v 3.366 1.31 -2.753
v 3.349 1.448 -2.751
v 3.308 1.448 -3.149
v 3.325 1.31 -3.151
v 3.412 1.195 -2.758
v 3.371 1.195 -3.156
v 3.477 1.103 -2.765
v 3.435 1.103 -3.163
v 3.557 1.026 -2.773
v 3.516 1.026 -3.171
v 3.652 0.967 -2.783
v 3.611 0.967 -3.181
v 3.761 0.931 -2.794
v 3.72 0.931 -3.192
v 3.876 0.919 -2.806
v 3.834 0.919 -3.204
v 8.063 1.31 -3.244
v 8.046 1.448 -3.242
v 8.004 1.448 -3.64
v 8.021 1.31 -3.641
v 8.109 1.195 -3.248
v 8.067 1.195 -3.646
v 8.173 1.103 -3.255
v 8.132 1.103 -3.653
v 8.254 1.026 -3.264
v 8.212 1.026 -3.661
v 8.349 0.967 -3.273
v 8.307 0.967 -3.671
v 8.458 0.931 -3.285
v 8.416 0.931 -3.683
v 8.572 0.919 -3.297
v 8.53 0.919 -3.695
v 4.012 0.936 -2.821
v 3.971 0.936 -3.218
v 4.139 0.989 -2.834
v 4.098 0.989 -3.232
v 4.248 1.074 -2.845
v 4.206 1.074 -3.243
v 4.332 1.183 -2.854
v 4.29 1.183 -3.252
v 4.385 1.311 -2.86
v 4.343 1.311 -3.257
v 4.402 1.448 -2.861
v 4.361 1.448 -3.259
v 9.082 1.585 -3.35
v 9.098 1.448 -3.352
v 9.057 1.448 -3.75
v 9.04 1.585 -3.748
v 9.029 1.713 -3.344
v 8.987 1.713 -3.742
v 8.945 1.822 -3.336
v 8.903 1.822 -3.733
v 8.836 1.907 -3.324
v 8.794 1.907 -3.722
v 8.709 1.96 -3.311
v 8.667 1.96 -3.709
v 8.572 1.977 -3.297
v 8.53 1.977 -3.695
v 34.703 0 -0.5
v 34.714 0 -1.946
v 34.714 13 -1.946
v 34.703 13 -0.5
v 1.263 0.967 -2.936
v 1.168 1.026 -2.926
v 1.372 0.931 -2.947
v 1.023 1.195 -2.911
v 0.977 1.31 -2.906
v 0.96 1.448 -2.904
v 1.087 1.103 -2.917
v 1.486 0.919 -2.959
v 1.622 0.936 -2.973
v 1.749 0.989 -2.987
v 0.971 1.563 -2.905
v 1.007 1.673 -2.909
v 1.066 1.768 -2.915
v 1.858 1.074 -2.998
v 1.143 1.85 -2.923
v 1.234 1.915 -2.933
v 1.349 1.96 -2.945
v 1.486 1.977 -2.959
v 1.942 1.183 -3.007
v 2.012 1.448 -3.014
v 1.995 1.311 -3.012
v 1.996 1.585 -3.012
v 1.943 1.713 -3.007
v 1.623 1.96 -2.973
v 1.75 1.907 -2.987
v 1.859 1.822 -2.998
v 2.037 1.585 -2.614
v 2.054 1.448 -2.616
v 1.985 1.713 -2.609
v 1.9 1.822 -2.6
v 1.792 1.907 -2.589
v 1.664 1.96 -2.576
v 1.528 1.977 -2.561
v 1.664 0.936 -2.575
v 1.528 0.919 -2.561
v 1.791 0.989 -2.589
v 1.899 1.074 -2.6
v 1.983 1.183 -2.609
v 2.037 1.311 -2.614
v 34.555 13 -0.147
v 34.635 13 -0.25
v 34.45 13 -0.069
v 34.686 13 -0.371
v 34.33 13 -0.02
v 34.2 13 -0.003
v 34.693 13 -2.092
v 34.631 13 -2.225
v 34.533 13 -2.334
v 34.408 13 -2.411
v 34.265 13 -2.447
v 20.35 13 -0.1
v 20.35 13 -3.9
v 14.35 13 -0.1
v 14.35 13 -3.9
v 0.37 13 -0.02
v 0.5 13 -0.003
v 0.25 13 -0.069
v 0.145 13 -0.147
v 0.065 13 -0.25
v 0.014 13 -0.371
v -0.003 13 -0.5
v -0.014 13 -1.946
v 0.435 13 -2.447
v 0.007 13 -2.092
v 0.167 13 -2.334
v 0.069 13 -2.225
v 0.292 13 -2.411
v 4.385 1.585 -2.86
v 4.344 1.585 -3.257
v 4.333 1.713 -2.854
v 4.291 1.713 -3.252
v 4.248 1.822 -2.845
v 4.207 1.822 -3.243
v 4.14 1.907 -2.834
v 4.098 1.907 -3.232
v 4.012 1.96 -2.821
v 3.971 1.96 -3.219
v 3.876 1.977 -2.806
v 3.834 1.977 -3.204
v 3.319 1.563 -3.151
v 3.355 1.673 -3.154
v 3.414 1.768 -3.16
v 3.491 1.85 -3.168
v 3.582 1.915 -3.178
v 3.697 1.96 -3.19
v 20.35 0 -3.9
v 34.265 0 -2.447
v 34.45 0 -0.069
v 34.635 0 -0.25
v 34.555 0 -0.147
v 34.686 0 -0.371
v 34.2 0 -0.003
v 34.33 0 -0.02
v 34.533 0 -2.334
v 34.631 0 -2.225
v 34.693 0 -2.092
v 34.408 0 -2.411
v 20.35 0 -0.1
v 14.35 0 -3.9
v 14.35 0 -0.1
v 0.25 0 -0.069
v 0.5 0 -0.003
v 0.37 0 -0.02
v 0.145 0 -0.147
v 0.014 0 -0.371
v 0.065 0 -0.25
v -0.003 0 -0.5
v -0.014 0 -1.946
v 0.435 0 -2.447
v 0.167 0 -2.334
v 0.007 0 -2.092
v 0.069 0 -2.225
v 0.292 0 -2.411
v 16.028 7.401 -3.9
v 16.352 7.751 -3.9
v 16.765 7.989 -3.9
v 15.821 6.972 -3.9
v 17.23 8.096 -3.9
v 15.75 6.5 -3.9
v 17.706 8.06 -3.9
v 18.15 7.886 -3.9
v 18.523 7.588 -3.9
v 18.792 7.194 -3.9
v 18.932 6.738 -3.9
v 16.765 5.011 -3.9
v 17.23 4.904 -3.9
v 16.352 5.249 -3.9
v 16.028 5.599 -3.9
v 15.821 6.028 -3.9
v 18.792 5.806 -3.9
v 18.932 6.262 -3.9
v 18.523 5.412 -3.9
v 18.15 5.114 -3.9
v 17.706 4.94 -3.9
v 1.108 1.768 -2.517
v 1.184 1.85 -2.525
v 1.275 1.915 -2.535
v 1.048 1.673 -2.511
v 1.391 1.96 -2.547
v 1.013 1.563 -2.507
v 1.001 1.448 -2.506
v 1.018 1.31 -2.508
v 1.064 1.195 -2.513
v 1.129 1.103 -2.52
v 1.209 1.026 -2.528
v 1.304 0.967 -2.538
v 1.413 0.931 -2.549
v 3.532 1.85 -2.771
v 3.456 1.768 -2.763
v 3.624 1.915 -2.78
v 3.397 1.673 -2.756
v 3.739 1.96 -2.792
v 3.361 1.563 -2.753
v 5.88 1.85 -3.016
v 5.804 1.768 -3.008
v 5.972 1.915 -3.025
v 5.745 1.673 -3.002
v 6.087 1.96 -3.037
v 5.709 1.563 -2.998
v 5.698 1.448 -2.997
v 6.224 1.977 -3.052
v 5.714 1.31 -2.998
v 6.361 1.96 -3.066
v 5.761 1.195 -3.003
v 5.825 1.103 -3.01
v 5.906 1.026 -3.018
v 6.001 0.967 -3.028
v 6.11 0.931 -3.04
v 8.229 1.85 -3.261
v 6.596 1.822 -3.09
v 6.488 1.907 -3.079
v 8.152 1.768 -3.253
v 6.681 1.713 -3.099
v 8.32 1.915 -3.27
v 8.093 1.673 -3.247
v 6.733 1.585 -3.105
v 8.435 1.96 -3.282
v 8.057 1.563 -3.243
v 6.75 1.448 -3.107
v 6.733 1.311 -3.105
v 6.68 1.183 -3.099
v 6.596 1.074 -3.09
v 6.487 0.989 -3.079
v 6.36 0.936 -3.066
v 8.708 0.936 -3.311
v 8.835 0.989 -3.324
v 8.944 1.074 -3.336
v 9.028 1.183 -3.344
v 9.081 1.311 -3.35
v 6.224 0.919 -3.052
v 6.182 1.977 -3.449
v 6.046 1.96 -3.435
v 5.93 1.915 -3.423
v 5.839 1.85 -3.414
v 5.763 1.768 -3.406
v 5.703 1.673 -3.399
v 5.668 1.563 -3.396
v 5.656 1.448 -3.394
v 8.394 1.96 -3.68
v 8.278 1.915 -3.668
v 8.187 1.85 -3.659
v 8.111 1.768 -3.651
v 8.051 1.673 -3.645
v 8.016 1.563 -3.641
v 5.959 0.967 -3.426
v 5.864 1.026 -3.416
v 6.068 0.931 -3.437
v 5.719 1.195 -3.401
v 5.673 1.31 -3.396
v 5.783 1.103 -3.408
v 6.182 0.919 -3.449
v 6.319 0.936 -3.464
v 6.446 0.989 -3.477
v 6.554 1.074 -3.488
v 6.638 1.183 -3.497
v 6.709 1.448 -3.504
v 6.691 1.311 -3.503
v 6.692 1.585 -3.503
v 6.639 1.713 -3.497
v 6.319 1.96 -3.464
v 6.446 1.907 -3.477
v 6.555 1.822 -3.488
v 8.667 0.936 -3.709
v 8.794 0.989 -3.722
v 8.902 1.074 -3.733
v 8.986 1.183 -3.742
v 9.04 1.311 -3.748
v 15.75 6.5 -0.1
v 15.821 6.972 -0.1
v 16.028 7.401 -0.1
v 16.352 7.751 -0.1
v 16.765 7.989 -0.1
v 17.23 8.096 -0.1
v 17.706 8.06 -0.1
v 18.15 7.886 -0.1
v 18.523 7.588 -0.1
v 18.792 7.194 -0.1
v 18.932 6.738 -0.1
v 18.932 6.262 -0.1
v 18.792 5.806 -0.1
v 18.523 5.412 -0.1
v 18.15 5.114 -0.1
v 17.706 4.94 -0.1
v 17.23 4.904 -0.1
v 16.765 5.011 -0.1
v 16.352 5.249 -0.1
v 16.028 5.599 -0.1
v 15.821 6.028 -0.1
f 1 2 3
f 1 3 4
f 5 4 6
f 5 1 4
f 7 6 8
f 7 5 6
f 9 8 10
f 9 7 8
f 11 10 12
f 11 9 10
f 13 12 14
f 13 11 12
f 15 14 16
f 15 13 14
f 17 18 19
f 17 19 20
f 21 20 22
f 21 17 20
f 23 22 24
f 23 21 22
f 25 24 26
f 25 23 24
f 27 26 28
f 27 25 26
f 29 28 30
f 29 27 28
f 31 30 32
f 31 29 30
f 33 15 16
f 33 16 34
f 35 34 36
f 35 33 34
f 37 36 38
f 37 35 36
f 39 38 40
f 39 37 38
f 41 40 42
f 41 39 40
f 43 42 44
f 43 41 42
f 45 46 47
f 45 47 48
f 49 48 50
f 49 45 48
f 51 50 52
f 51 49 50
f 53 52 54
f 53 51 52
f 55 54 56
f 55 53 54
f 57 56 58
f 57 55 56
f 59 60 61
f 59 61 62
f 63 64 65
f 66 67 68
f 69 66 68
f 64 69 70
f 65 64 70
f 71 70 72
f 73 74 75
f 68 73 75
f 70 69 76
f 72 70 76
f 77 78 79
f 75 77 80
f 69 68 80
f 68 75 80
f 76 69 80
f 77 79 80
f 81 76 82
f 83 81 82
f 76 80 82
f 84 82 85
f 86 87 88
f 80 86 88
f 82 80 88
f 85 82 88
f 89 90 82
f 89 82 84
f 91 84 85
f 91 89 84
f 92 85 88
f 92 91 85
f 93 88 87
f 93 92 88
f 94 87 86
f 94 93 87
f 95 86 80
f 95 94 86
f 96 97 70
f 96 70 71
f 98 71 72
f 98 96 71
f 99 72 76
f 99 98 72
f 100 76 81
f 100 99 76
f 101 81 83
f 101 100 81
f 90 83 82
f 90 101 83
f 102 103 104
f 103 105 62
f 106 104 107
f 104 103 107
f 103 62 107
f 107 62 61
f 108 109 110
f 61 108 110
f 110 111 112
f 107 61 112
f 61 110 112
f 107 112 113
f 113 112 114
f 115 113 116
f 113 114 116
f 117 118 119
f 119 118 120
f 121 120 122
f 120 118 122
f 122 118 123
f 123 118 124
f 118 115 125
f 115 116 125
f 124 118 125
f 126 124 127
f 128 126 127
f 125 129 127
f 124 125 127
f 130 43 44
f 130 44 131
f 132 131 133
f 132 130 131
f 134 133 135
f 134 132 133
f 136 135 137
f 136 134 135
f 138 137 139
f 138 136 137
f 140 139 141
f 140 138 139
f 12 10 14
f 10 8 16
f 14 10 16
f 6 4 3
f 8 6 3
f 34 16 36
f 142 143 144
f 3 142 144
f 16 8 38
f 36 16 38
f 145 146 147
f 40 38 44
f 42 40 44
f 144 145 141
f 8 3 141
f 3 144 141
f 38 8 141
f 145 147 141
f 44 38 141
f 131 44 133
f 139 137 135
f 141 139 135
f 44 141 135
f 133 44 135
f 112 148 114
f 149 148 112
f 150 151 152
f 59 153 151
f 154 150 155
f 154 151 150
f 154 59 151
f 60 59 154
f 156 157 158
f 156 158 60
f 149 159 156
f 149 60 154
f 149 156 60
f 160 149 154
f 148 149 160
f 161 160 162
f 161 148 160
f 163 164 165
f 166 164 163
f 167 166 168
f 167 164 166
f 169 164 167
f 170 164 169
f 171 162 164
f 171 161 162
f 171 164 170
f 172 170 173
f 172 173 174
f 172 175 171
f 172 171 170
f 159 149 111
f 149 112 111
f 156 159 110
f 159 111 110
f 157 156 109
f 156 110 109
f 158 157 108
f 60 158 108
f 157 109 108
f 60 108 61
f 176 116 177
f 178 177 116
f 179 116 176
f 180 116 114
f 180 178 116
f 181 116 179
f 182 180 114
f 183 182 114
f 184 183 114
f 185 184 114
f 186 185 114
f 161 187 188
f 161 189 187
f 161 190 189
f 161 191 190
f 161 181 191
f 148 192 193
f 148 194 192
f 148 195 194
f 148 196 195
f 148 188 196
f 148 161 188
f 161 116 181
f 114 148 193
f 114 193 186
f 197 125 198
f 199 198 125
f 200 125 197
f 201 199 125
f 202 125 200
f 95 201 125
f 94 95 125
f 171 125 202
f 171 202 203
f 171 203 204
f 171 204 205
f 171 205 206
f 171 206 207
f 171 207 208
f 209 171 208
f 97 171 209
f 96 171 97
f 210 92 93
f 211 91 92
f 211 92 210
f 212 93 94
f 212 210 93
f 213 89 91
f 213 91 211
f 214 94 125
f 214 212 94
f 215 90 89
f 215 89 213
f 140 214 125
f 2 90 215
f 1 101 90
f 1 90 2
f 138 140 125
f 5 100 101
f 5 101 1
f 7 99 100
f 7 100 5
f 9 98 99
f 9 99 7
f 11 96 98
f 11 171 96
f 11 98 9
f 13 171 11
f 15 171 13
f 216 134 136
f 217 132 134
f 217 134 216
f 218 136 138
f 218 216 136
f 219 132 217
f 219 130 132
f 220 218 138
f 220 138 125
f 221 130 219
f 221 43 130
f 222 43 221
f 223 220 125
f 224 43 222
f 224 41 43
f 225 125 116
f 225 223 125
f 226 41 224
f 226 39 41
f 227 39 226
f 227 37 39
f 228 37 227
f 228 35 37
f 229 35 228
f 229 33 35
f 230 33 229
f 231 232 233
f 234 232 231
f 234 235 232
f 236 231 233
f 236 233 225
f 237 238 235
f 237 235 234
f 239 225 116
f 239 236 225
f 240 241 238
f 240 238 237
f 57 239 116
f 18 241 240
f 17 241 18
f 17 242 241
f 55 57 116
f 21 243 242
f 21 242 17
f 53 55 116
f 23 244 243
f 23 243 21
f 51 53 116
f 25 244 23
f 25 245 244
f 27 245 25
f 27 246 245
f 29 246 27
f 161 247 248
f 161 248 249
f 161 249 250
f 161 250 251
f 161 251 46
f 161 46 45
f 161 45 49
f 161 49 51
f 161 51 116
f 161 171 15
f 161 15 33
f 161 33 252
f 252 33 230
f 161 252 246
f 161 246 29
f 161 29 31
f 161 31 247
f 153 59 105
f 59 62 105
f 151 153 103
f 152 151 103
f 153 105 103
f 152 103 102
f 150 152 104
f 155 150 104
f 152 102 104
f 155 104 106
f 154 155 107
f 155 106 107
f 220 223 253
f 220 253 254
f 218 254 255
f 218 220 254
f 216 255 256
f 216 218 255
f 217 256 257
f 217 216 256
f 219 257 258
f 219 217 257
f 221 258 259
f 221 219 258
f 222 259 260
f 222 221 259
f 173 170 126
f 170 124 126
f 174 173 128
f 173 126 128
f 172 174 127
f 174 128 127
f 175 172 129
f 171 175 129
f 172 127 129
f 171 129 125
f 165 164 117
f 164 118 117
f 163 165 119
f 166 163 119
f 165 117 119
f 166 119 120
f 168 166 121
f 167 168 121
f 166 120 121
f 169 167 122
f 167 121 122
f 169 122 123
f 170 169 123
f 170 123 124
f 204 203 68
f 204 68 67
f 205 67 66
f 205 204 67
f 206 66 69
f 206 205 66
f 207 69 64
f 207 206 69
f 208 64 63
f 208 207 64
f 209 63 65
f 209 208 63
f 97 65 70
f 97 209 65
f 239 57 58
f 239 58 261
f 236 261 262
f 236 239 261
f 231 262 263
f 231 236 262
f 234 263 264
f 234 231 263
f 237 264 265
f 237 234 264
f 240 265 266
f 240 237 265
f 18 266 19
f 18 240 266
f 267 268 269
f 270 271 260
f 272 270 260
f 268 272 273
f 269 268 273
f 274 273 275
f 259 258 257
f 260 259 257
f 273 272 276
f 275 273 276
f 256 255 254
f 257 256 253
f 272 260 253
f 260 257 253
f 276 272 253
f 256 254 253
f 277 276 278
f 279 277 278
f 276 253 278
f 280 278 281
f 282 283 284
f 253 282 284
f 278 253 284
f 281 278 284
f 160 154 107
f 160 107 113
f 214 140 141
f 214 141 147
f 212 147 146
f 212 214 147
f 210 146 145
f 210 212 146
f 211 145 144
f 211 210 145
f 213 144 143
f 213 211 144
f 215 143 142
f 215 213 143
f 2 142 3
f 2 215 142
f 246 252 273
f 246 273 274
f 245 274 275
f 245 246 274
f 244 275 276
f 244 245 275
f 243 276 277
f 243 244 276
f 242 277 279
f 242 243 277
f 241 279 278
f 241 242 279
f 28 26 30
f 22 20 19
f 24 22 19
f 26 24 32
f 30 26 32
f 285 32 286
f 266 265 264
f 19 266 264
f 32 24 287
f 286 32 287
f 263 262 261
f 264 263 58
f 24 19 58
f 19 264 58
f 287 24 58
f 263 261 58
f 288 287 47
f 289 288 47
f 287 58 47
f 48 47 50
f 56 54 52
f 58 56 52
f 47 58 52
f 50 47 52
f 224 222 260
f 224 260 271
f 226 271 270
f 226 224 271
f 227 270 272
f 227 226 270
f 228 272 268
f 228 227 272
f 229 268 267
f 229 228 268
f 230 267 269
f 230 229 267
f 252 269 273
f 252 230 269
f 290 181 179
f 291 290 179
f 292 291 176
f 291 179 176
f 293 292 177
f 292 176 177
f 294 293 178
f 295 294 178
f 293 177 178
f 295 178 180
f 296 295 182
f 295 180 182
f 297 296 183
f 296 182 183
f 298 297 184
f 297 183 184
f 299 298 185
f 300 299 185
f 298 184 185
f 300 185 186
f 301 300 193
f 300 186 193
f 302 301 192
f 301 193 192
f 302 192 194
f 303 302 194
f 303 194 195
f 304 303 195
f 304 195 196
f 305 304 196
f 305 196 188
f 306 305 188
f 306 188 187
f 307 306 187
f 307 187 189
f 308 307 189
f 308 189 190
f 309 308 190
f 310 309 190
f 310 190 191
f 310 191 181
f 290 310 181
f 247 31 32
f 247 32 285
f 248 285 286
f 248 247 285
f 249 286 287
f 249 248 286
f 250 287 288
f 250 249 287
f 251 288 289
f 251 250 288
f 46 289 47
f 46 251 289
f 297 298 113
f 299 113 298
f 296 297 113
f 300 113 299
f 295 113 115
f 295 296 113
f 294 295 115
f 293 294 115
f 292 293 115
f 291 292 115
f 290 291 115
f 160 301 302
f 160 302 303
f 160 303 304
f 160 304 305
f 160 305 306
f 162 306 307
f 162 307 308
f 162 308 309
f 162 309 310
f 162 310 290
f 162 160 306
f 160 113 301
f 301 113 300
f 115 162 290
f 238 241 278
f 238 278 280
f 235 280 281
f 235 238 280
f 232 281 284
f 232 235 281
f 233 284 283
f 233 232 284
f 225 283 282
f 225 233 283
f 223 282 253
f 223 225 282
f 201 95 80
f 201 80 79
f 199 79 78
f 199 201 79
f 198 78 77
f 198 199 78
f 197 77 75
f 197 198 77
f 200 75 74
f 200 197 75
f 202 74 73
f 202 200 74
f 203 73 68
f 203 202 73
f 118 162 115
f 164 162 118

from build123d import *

# Parameters (mm, degrees)
BOSS_EXTRUDE1_DEPTH       = 13
FILLET2_R                 = 0.5
SKETCH2_R                 = 1.6
CUT_EXTRUDE1_DEPTH        = 4.896527904
REVISION_INDICATION_DEPTH = 0.4


with BuildPart() as part:
    # Sketch1 → Boss-Extrude1 (new body)
    with BuildSketch(Plane(origin=(0, 0, 0), x_dir=(1, 0, 0), z_dir=(0, 1, 0))):
        Polygon((20.35, 0.1), (14.35, 0.1), (0, 0), (-0.016724739, 2.4), (14.35, 3.9), (20.35, 3.9), (34.716724739, 2.4), (34.7, 0), align=None)
    extrude(amount=BOSS_EXTRUDE1_DEPTH)

    # Fillet2
    fillet2_edges = [part.edges().sort_by_distance(p)[0] for p in [
        (-0.016724739, 6.5, -2.4),
        (34.716724739, 6.5, -2.4),
        (34.7, 6.5, 0),
        (0, 6.5, 0),
    ]]
    fillet(fillet2_edges, radius=FILLET2_R)

    # Sketch2 → Cut-Extrude1 (cut, through all)
    with BuildSketch(Plane(origin=(0, 0, -3.9), x_dir=(-1, 0, 0), z_dir=(0, 0, -1))):
        with Locations((-17.35, 6.5)):
            Circle(SKETCH2_R)
    extrude(amount=-CUT_EXTRUDE1_DEPTH, mode=Mode.SUBTRACT)

    # Sketch5 → revision indication (add)
    with BuildSketch(Plane(origin=(-0.248057274, 0, -2.375847049), x_dir=(-0.994593653, 0, 0.103843465), z_dir=(-0.103843465, 0, -0.994593653))):
        with BuildLine():
            add(Edge.make_bspline(
                [(-1.785308798, 1.976923077), (-1.749947985, 1.974821832), (-1.680627244, 1.970702586), (-1.580407683, 1.942442049), (-1.489703086, 1.892261337), (-1.40890887, 1.825381725), (-1.342312834, 1.744291021), (-1.290343795, 1.654309873), (-1.262329436, 1.553251269), (-1.258240196, 1.483528859), (-1.256142132, 1.44775641)],
                knots=[0, 0, 0, 0, 0.000106068, 0.000207934, 0.000309251, 0.000414952, 0.000520654, 0.000622584, 0.00072445, 0.000831784, 0.000831784, 0.000831784, 0.000831784], degree=3))
            add(Edge.make_bspline(
                [(-1.256142132, 1.44775641), (-1.258311293, 1.412843512), (-1.262588847, 1.343995789), (-1.290279579, 1.243699421), (-1.342708899, 1.153662038), (-1.408449529, 1.071471016), (-1.489723058, 1.004449722), (-1.580622123, 0.954695939), (-1.680391977, 0.924411918), (-1.749908735, 0.920554208), (-1.785308798, 0.918589744)],
                knots=[0, 0, 0, 0, 0.000104802, 0.000206668, 0.000308598, 0.000415282, 0.000520984, 0.0006223, 0.000724523, 0.000830591, 0.000830591, 0.000830591, 0.000830591], degree=3))
            add(Edge.make_bspline(
                [(-1.785308798, 0.918589744), (-1.82073437, 0.920483127), (-1.889894366, 0.924179507), (-1.989291812, 0.955317742), (-2.080744455, 1.003983162), (-2.162002161, 1.071595984), (-2.228293388, 1.153239101), (-2.278413725, 1.244319503), (-2.308512996, 1.343708683), (-2.312471536, 1.412786963), (-2.314475465, 1.44775641)],
                knots=[0, 0, 0, 0, 0.000106068, 0.000207073, 0.000309509, 0.000415211, 0.000521895, 0.000623212, 0.000725435, 0.000830237, 0.000830237, 0.000830237, 0.000830237], degree=3))
            add(Edge.make_bspline(
                [(-2.314475465, 1.44775641), (-2.312548513, 1.483587428), (-2.308786377, 1.553543092), (-2.278350536, 1.653690044), (-2.228682266, 1.744709926), (-2.161543907, 1.825258007), (-2.080764113, 1.892726399), (-1.989512426, 1.941829667), (-1.889654975, 1.970931558), (-1.820694086, 1.974891267), (-1.785308798, 1.976923077)],
                knots=[0, 0, 0, 0, 0.000107334, 0.000209557, 0.000310874, 0.000416575, 0.000522277, 0.000624713, 0.000725357, 0.000831425, 0.000831425, 0.000831425, 0.000831425], degree=3))
        make_face()
        with BuildLine():
            add(Edge.make_bspline(
                [(-4.146206234, 1.976923077), (-4.110845421, 1.974821832), (-4.04152468, 1.970702586), (-3.941305118, 1.942442049), (-3.850600522, 1.892261337), (-3.769806306, 1.825381725), (-3.70321027, 1.744291021), (-3.651241231, 1.654309873), (-3.623226872, 1.553251269), (-3.619137632, 1.483528859), (-3.617039568, 1.44775641)],
                knots=[0, 0, 0, 0, 0.000106068, 0.000207934, 0.000309251, 0.000414952, 0.000520654, 0.000622584, 0.00072445, 0.000831784, 0.000831784, 0.000831784, 0.000831784], degree=3))
            add(Edge.make_bspline(
                [(-3.617039568, 1.44775641), (-3.619208729, 1.412843512), (-3.623486283, 1.343995789), (-3.651177015, 1.243699421), (-3.703606335, 1.153662038), (-3.769346965, 1.071471016), (-3.850620494, 1.004449722), (-3.941519559, 0.954695939), (-4.041289413, 0.924411918), (-4.110806171, 0.920554208), (-4.146206234, 0.918589744)],
                knots=[0, 0, 0, 0, 0.000104802, 0.000206668, 0.000308598, 0.000415282, 0.000520984, 0.0006223, 0.000724523, 0.000830591, 0.000830591, 0.000830591, 0.000830591], degree=3))
            add(Edge.make_bspline(
                [(-4.146206234, 0.918589744), (-4.181631806, 0.920483127), (-4.250791802, 0.924179507), (-4.350189248, 0.955317742), (-4.441641891, 1.003983162), (-4.522899597, 1.071595984), (-4.589190824, 1.153239101), (-4.639311161, 1.244319503), (-4.669410431, 1.343708683), (-4.673368972, 1.412786963), (-4.675372901, 1.44775641)],
                knots=[0, 0, 0, 0, 0.000106068, 0.000207073, 0.000309509, 0.000415211, 0.000521895, 0.000623212, 0.000725435, 0.000830237, 0.000830237, 0.000830237, 0.000830237], degree=3))
            add(Edge.make_bspline(
                [(-4.675372901, 1.44775641), (-4.673445949, 1.483587428), (-4.669683813, 1.553543092), (-4.639247972, 1.653690044), (-4.589579702, 1.744709926), (-4.522441343, 1.825258007), (-4.441661549, 1.892726399), (-4.350409862, 1.941829667), (-4.25055241, 1.970931558), (-4.181591522, 1.974891267), (-4.146206234, 1.976923077)],
                knots=[0, 0, 0, 0, 0.000107334, 0.000209557, 0.000310874, 0.000416575, 0.000522277, 0.000624713, 0.000725357, 0.000831425, 0.000831425, 0.000831425, 0.000831425], degree=3))
        make_face()
        with BuildLine():
            add(Edge.make_bspline(
                [(-6.50710367, 1.976923077), (-6.471742857, 1.974821832), (-6.402422116, 1.970702586), (-6.302202554, 1.942442049), (-6.211497957, 1.892261337), (-6.130703742, 1.825381725), (-6.064107706, 1.744291021), (-6.012138667, 1.654309873), (-5.984124308, 1.553251269), (-5.980035068, 1.483528859), (-5.977937003, 1.44775641)],
                knots=[0, 0, 0, 0, 0.000106068, 0.000207934, 0.000309251, 0.000414952, 0.000520654, 0.000622584, 0.00072445, 0.000831784, 0.000831784, 0.000831784, 0.000831784], degree=3))
            add(Edge.make_bspline(
                [(-5.977937003, 1.44775641), (-5.980106165, 1.412843512), (-5.984383719, 1.343995789), (-6.012074451, 1.243699421), (-6.064503771, 1.153662038), (-6.130244401, 1.071471016), (-6.21151793, 1.004449722), (-6.302416994, 0.954695939), (-6.402186849, 0.924411918), (-6.471703607, 0.920554208), (-6.50710367, 0.918589744)],
                knots=[0, 0, 0, 0, 0.000104802, 0.000206668, 0.000308598, 0.000415282, 0.000520984, 0.0006223, 0.000724523, 0.000830591, 0.000830591, 0.000830591, 0.000830591], degree=3))
            add(Edge.make_bspline(
                [(-6.50710367, 0.918589744), (-6.542529242, 0.920483127), (-6.611689237, 0.924179507), (-6.711086684, 0.955317742), (-6.802539327, 1.003983162), (-6.883797033, 1.071595984), (-6.95008826, 1.153239101), (-7.000208597, 1.244319503), (-7.030307867, 1.343708683), (-7.034266408, 1.412786963), (-7.036270337, 1.44775641)],
                knots=[0, 0, 0, 0, 0.000106068, 0.000207073, 0.000309509, 0.000415211, 0.000521895, 0.000623212, 0.000725435, 0.000830237, 0.000830237, 0.000830237, 0.000830237], degree=3))
            add(Edge.make_bspline(
                [(-7.036270337, 1.44775641), (-7.034343385, 1.483587428), (-7.030581249, 1.553543092), (-7.000145408, 1.653690044), (-6.950477138, 1.744709926), (-6.883338779, 1.825258007), (-6.802558985, 1.892726399), (-6.711307298, 1.941829667), (-6.611449846, 1.970931558), (-6.542488958, 1.974891267), (-6.50710367, 1.976923077)],
                knots=[0, 0, 0, 0, 0.000107334, 0.000209557, 0.000310874, 0.000416575, 0.000522277, 0.000624713, 0.000725357, 0.000831425, 0.000831425, 0.000831425, 0.000831425], degree=3))
        make_face()
        with BuildLine():
            add(Edge.make_bspline(
                [(-8.868001106, 1.976923077), (-8.832640293, 1.974821832), (-8.763319552, 1.970702586), (-8.66309999, 1.942442049), (-8.572395393, 1.892261337), (-8.491601178, 1.825381725), (-8.425005142, 1.744291021), (-8.373036103, 1.654309873), (-8.345021744, 1.553251269), (-8.340932504, 1.483528859), (-8.338834439, 1.44775641)],
                knots=[0, 0, 0, 0, 0.000106068, 0.000207934, 0.000309251, 0.000414952, 0.000520654, 0.000622584, 0.00072445, 0.000831784, 0.000831784, 0.000831784, 0.000831784], degree=3))
            add(Edge.make_bspline(
                [(-8.338834439, 1.44775641), (-8.341003601, 1.412843512), (-8.345281155, 1.343995789), (-8.372971887, 1.243699421), (-8.425401207, 1.153662038), (-8.491141837, 1.071471016), (-8.572415366, 1.004449722), (-8.66331443, 0.954695939), (-8.763084284, 0.924411918), (-8.832601042, 0.920554208), (-8.868001106, 0.918589744)],
                knots=[0, 0, 0, 0, 0.000104802, 0.000206668, 0.000308598, 0.000415282, 0.000520984, 0.0006223, 0.000724523, 0.000830591, 0.000830591, 0.000830591, 0.000830591], degree=3))
            add(Edge.make_bspline(
                [(-8.868001106, 0.918589744), (-8.903426678, 0.920483127), (-8.972586673, 0.924179507), (-9.07198412, 0.955317742), (-9.163436763, 1.003983162), (-9.244694469, 1.071595984), (-9.310985696, 1.153239101), (-9.361106033, 1.244319503), (-9.391205303, 1.343708683), (-9.395163844, 1.412786963), (-9.397167773, 1.44775641)],
                knots=[0, 0, 0, 0, 0.000106068, 0.000207073, 0.000309509, 0.000415211, 0.000521895, 0.000623212, 0.000725435, 0.000830237, 0.000830237, 0.000830237, 0.000830237], degree=3))
            add(Edge.make_bspline(
                [(-9.397167773, 1.44775641), (-9.395240821, 1.483587428), (-9.391478685, 1.553543092), (-9.361042844, 1.653690044), (-9.311374574, 1.744709926), (-9.244236214, 1.825258007), (-9.16345642, 1.892726399), (-9.072204734, 1.941829667), (-8.972347282, 1.970931558), (-8.903386394, 1.974891267), (-8.868001106, 1.976923077)],
                knots=[0, 0, 0, 0, 0.000107334, 0.000209557, 0.000310874, 0.000416575, 0.000522277, 0.000624713, 0.000725357, 0.000831425, 0.000831425, 0.000831425, 0.000831425], degree=3))
        make_face()
    extrude(amount=REVISION_INDICATION_DEPTH)


solid = part.part
